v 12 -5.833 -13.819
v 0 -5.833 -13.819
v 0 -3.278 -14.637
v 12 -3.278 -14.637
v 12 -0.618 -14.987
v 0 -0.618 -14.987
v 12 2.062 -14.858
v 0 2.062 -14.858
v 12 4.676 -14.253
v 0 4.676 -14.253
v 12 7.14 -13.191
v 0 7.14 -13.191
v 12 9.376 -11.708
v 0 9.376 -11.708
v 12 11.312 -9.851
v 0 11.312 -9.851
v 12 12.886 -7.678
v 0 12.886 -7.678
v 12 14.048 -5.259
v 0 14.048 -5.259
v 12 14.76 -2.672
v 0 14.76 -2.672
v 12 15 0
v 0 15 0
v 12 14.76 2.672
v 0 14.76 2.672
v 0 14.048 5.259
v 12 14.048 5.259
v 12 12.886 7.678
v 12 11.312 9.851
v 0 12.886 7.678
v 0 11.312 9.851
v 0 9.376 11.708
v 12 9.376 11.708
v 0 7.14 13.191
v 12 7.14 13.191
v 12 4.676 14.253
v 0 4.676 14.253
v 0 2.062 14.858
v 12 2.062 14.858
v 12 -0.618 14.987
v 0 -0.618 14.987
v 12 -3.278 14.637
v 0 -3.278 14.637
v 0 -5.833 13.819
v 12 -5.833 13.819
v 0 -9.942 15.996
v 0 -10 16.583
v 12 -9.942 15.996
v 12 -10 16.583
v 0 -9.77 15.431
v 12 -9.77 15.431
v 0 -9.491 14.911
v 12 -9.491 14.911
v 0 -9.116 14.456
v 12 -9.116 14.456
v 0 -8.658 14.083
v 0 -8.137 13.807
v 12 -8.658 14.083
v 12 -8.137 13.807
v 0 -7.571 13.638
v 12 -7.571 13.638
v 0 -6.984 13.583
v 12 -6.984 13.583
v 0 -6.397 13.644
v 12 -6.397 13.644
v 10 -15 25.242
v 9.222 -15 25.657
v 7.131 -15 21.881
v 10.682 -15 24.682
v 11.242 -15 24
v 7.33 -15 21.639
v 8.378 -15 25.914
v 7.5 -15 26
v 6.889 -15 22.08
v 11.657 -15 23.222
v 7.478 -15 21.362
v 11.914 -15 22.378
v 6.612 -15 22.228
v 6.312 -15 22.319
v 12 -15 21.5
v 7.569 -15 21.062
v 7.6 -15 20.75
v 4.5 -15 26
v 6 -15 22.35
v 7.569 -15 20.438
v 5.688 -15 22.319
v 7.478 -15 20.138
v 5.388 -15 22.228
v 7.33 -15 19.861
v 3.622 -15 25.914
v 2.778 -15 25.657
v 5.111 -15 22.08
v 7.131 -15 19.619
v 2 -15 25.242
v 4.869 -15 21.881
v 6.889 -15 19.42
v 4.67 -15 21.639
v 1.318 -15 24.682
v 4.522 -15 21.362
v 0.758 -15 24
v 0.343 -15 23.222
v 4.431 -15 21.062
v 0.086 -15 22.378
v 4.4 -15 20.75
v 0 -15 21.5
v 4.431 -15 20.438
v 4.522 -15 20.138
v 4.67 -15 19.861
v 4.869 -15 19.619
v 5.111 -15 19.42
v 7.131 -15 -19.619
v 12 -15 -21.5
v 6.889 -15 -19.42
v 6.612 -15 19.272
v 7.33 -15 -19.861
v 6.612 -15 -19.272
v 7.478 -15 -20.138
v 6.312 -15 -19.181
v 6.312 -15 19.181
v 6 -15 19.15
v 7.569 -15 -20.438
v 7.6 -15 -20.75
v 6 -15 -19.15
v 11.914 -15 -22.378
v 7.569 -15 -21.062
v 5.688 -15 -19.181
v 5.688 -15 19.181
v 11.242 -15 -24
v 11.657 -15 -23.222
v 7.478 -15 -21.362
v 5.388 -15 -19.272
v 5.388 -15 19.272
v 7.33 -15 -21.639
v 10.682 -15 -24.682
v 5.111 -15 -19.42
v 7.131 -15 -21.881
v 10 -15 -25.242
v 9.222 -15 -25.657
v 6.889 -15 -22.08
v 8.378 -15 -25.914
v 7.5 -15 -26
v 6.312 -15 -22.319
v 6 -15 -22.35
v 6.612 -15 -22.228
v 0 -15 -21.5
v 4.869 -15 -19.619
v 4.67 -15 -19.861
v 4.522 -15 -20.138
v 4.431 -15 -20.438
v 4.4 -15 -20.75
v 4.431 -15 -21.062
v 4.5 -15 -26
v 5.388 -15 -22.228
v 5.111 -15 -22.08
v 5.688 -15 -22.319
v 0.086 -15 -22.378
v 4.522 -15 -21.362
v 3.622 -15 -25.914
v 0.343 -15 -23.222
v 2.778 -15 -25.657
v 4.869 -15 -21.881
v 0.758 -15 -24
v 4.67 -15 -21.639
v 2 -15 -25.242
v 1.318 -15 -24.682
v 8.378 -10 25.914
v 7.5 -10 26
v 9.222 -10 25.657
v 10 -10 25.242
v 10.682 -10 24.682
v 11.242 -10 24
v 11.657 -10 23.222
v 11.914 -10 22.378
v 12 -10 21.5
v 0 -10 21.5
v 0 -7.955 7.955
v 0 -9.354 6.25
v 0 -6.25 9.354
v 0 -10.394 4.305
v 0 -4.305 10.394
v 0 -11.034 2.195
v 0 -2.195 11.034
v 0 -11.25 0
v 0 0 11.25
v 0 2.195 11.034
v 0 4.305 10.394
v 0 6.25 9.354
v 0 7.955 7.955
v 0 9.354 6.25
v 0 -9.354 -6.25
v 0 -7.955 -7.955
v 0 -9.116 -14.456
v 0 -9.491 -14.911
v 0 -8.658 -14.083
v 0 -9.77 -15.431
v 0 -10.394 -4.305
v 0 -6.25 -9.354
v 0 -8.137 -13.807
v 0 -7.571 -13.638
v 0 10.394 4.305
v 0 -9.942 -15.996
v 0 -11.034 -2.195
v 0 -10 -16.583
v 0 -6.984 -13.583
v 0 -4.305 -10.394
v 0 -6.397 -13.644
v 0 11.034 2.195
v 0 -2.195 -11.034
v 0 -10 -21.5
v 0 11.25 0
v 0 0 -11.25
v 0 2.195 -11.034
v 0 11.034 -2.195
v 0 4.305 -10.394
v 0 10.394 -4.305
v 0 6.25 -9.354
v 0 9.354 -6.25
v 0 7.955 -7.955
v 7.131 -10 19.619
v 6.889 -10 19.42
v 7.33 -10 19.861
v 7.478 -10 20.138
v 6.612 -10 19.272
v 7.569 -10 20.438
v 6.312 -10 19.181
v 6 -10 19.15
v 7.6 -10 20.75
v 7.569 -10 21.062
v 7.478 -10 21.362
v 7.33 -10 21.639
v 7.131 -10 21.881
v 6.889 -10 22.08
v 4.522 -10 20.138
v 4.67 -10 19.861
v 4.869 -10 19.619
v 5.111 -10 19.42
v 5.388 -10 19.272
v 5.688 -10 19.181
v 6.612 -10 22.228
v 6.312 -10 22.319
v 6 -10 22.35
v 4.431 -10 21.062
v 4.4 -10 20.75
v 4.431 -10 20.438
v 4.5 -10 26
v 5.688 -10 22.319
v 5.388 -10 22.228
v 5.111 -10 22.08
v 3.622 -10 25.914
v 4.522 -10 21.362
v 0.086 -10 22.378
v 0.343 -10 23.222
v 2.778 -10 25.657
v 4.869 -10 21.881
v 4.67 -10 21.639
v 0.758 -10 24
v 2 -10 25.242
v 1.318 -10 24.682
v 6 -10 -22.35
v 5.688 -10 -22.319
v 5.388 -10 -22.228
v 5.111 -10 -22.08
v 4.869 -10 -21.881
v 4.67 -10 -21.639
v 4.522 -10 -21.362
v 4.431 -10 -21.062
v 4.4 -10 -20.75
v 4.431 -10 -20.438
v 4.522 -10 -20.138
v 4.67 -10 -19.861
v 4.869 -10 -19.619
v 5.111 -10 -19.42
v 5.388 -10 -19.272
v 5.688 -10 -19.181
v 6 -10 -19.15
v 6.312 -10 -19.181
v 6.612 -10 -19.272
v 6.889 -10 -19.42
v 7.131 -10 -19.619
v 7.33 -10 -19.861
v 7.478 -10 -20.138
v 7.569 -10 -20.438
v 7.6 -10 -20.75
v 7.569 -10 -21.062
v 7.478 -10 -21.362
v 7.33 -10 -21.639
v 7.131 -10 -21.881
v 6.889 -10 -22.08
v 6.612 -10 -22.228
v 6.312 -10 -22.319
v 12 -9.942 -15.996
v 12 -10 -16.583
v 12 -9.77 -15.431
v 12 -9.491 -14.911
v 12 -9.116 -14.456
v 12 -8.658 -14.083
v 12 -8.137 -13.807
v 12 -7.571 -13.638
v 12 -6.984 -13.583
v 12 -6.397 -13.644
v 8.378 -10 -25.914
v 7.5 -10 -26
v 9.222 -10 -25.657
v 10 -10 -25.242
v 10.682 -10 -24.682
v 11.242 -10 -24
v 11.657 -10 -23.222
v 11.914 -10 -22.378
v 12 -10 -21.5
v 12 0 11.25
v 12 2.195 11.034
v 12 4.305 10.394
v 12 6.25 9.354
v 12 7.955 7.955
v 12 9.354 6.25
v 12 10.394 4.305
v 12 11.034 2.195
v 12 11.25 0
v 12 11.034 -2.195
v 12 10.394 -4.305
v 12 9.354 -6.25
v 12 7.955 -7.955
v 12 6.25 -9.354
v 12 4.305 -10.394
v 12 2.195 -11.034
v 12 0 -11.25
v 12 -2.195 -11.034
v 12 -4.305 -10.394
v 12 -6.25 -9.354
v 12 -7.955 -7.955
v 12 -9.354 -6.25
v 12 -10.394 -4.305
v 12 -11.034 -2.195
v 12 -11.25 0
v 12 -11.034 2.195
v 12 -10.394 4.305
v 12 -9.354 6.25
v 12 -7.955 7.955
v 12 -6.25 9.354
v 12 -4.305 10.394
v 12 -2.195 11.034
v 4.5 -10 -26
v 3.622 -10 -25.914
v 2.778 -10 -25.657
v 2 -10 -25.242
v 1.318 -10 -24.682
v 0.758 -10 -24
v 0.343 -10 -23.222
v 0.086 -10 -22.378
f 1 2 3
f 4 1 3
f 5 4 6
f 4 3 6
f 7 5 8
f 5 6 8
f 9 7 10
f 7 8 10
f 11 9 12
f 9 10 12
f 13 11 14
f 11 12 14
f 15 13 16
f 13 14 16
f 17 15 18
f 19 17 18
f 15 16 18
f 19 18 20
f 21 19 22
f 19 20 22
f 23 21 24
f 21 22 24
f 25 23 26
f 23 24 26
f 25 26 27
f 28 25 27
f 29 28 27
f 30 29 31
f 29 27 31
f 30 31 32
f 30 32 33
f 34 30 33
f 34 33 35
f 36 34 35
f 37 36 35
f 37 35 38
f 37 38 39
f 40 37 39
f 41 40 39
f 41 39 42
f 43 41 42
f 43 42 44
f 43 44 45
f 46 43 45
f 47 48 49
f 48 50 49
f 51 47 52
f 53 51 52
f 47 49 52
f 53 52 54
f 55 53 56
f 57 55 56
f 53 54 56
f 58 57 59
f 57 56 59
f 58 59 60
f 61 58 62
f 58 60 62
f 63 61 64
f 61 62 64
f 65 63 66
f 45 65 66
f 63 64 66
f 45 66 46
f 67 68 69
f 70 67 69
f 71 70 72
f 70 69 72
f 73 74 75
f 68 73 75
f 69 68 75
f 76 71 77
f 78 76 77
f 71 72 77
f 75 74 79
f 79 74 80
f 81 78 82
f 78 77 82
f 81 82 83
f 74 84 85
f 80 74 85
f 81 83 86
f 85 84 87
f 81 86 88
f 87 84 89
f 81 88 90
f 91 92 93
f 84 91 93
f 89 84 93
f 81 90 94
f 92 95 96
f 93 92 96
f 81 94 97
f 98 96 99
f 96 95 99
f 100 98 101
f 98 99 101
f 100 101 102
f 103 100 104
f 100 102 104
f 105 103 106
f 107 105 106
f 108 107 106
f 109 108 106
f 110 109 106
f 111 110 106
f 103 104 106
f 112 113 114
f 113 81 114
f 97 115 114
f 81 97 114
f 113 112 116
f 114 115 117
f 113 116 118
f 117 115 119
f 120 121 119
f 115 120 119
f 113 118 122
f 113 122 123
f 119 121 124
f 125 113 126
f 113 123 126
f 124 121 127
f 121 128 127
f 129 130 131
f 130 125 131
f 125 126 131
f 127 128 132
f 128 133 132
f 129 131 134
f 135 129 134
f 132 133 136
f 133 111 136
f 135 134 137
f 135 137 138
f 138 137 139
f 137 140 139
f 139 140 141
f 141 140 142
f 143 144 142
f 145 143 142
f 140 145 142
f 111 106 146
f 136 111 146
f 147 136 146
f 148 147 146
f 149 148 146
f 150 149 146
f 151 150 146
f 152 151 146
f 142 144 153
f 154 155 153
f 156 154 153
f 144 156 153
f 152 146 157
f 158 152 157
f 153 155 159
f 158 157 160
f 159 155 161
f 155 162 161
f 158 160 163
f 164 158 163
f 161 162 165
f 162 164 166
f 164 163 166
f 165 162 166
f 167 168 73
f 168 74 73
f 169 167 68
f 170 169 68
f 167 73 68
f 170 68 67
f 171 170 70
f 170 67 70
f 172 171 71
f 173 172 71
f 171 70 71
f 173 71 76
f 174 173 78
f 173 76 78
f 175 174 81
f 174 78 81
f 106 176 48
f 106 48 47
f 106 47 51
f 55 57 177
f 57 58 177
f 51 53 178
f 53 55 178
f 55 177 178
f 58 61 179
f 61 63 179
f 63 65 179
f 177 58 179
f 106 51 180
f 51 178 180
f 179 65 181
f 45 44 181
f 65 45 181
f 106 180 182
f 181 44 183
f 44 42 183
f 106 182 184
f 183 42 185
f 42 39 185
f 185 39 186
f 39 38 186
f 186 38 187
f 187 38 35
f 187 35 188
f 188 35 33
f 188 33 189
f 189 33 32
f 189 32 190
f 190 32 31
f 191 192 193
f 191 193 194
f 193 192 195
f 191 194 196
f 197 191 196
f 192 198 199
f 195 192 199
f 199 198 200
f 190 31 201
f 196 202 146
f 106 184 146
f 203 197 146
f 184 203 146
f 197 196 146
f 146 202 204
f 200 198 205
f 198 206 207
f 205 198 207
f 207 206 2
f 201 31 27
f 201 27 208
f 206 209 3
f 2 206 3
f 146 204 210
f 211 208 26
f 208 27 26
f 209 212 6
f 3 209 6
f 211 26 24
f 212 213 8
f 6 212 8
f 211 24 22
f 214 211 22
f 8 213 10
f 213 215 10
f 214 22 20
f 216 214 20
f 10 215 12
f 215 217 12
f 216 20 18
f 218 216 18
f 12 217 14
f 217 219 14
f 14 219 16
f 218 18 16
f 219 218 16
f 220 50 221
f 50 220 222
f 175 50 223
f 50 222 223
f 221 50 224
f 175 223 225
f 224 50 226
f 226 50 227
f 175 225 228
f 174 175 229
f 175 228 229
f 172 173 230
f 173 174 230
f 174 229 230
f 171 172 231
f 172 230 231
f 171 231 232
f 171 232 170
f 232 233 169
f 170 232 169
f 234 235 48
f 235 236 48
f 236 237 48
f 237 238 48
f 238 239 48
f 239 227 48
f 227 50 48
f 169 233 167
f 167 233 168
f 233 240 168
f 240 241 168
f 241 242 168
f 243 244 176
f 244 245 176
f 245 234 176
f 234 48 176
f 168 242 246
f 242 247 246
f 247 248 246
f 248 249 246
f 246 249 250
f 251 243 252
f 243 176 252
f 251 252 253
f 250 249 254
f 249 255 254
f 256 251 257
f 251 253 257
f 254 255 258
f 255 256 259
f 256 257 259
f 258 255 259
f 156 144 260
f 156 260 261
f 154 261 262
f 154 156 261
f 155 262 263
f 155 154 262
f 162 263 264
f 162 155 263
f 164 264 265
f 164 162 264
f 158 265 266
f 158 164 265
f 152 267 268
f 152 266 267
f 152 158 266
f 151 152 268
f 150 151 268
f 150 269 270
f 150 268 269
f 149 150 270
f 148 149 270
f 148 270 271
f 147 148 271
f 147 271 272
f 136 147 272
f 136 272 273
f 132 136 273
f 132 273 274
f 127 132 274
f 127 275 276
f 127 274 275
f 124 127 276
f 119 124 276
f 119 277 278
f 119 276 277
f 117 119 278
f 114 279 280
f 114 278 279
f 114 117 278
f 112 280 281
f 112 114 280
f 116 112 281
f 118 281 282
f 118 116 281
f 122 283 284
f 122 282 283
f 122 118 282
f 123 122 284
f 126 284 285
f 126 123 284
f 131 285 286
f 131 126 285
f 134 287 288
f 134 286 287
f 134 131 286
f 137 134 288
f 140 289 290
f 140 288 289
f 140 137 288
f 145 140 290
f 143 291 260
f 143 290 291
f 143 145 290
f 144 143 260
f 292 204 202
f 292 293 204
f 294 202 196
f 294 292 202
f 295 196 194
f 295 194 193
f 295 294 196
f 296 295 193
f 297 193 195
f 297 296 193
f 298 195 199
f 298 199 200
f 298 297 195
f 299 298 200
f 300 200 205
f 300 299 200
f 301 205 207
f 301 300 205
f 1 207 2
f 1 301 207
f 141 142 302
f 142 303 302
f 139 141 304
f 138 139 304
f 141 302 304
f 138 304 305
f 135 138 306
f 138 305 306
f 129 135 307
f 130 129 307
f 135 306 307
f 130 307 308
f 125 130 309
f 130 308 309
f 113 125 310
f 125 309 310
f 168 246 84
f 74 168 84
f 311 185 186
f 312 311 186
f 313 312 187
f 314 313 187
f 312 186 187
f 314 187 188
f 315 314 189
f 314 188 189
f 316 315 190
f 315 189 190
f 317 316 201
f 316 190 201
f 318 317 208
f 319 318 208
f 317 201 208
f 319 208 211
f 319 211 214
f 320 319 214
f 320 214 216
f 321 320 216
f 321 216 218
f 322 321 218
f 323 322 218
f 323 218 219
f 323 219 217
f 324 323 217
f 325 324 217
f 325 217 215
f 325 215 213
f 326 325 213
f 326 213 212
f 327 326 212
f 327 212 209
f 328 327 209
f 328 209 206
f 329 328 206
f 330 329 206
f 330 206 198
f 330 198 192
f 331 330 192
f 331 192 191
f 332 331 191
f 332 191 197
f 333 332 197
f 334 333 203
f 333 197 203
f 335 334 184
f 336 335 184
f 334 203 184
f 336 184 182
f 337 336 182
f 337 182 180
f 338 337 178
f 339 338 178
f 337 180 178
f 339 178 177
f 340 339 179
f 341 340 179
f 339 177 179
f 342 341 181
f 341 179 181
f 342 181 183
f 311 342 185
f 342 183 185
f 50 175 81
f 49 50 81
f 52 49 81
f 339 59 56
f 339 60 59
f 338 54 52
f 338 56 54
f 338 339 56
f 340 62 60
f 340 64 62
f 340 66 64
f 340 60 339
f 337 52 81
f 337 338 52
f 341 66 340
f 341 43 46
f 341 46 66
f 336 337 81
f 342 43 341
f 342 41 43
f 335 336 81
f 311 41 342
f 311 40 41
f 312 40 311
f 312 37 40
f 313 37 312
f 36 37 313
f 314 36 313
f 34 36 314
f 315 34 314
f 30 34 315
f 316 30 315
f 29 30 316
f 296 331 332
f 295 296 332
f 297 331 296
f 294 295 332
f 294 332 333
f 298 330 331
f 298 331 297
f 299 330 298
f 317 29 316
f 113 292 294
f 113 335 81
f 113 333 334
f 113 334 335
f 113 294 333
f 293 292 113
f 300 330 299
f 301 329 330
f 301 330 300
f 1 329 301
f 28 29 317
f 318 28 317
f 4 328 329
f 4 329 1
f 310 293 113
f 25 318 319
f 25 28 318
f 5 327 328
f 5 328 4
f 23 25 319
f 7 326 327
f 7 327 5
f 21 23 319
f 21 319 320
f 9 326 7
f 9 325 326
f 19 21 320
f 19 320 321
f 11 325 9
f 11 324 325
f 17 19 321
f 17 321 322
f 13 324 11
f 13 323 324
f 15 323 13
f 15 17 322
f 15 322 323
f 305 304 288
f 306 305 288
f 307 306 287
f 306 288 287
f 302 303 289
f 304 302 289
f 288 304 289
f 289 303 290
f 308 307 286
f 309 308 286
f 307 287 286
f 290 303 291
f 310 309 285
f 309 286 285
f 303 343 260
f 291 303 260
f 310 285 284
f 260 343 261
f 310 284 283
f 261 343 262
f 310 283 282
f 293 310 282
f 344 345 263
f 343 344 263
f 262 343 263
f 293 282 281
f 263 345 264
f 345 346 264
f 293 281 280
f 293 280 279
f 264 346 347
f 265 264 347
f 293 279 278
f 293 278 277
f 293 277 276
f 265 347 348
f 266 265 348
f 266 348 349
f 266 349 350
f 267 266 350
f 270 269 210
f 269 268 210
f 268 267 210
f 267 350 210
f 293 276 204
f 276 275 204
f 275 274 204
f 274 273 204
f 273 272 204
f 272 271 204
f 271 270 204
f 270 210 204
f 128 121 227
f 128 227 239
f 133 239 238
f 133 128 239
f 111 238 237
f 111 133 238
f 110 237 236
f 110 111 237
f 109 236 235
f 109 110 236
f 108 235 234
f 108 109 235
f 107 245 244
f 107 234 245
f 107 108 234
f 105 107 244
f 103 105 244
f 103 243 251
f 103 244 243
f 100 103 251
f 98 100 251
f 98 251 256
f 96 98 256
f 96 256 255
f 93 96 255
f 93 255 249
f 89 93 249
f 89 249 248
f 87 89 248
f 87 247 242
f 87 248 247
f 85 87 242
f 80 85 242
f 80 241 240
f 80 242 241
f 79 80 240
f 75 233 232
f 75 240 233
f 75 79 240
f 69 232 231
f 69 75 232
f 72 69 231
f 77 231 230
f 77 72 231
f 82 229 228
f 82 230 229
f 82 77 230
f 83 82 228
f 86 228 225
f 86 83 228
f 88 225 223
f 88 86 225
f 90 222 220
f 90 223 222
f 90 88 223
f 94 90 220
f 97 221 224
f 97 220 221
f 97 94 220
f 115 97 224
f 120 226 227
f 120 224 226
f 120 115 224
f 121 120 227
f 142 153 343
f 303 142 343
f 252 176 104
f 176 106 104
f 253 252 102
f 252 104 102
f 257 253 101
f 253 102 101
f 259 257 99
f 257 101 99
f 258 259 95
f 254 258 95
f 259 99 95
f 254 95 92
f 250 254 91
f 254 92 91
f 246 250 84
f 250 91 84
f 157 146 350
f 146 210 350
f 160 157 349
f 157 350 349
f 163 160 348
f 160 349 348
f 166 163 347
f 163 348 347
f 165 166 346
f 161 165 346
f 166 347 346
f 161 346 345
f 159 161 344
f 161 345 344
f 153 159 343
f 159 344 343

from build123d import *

# Parameters (mm, degrees)
SALIENTE_EXTRUIR1_DEPTH    = 12
CROQUIS2_R                 = 11.25
CORTAR_EXTRUIR1_DEPTH      = 33.32645975
REDONDEO1_R                = 3
REDONDEO2_R                = 4.5
CORTAR_EXTRUIR2_DEPTH      = 10
CORTAR_EXTRUIR2_DEPTH_BACK = 39.013155617
CROQUIS3_R                 = 1.6


with BuildPart() as part:
    # Croquis1 → Saliente-Extruir1 (new body)
    with BuildSketch(Plane(origin=(0, 0, 0), x_dir=(0, 0, -1), z_dir=(1, 0, 0))):
        with BuildLine():
            Line((-26, -15), (26, -15))
            Line((26, -15), (26, -10))
            Line((26, -10), (11.180339887, -10))
            ThreePointArc((11.180339887, -10), (0, 15), (-11.180339887, -10))
            Line((-11.180339887, -10), (-26, -10))
            Line((-26, -10), (-26, -15))
        make_face()
    extrude(amount=SALIENTE_EXTRUIR1_DEPTH)

    # Croquis2 → Cortar-Extruir1 (cut, through all)
    with BuildSketch(Plane.ZY):
        Circle(CROQUIS2_R)
    extrude(amount=-CORTAR_EXTRUIR1_DEPTH, mode=Mode.SUBTRACT)

    # Redondeo1
    redondeo1_edges = [part.edges().sort_by_distance(p)[0] for p in [
        (6, -10, 11.180339887),
        (6, -10, -11.180339887),
    ]]
    fillet(redondeo1_edges, radius=REDONDEO1_R)

    # Redondeo2
    redondeo2_edges = [part.edges().sort_by_distance(p)[0] for p in [
        (12, -12.5, -26),
        (0, -12.5, -26),
        (0, -12.5, 26),
        (12, -12.5, 26),
    ]]
    fillet(redondeo2_edges, radius=REDONDEO2_R)

    # Croquis3 → Cortar-Extruir2 (cut, two sides: drawn at the far end of the back side and taken through both)
    with BuildSketch(Plane(origin=(0, -10, 0), x_dir=(1, 0, 0), z_dir=(0, 1, 0)).offset(-CORTAR_EXTRUIR2_DEPTH_BACK)):
        with Locations((6, 20.75)):
            Circle(CROQUIS3_R)
        with Locations((6, -20.75)):
            Circle(CROQUIS3_R)
    extrude(amount=CORTAR_EXTRUIR2_DEPTH + CORTAR_EXTRUIR2_DEPTH_BACK, mode=Mode.SUBTRACT)


solid = part.part
